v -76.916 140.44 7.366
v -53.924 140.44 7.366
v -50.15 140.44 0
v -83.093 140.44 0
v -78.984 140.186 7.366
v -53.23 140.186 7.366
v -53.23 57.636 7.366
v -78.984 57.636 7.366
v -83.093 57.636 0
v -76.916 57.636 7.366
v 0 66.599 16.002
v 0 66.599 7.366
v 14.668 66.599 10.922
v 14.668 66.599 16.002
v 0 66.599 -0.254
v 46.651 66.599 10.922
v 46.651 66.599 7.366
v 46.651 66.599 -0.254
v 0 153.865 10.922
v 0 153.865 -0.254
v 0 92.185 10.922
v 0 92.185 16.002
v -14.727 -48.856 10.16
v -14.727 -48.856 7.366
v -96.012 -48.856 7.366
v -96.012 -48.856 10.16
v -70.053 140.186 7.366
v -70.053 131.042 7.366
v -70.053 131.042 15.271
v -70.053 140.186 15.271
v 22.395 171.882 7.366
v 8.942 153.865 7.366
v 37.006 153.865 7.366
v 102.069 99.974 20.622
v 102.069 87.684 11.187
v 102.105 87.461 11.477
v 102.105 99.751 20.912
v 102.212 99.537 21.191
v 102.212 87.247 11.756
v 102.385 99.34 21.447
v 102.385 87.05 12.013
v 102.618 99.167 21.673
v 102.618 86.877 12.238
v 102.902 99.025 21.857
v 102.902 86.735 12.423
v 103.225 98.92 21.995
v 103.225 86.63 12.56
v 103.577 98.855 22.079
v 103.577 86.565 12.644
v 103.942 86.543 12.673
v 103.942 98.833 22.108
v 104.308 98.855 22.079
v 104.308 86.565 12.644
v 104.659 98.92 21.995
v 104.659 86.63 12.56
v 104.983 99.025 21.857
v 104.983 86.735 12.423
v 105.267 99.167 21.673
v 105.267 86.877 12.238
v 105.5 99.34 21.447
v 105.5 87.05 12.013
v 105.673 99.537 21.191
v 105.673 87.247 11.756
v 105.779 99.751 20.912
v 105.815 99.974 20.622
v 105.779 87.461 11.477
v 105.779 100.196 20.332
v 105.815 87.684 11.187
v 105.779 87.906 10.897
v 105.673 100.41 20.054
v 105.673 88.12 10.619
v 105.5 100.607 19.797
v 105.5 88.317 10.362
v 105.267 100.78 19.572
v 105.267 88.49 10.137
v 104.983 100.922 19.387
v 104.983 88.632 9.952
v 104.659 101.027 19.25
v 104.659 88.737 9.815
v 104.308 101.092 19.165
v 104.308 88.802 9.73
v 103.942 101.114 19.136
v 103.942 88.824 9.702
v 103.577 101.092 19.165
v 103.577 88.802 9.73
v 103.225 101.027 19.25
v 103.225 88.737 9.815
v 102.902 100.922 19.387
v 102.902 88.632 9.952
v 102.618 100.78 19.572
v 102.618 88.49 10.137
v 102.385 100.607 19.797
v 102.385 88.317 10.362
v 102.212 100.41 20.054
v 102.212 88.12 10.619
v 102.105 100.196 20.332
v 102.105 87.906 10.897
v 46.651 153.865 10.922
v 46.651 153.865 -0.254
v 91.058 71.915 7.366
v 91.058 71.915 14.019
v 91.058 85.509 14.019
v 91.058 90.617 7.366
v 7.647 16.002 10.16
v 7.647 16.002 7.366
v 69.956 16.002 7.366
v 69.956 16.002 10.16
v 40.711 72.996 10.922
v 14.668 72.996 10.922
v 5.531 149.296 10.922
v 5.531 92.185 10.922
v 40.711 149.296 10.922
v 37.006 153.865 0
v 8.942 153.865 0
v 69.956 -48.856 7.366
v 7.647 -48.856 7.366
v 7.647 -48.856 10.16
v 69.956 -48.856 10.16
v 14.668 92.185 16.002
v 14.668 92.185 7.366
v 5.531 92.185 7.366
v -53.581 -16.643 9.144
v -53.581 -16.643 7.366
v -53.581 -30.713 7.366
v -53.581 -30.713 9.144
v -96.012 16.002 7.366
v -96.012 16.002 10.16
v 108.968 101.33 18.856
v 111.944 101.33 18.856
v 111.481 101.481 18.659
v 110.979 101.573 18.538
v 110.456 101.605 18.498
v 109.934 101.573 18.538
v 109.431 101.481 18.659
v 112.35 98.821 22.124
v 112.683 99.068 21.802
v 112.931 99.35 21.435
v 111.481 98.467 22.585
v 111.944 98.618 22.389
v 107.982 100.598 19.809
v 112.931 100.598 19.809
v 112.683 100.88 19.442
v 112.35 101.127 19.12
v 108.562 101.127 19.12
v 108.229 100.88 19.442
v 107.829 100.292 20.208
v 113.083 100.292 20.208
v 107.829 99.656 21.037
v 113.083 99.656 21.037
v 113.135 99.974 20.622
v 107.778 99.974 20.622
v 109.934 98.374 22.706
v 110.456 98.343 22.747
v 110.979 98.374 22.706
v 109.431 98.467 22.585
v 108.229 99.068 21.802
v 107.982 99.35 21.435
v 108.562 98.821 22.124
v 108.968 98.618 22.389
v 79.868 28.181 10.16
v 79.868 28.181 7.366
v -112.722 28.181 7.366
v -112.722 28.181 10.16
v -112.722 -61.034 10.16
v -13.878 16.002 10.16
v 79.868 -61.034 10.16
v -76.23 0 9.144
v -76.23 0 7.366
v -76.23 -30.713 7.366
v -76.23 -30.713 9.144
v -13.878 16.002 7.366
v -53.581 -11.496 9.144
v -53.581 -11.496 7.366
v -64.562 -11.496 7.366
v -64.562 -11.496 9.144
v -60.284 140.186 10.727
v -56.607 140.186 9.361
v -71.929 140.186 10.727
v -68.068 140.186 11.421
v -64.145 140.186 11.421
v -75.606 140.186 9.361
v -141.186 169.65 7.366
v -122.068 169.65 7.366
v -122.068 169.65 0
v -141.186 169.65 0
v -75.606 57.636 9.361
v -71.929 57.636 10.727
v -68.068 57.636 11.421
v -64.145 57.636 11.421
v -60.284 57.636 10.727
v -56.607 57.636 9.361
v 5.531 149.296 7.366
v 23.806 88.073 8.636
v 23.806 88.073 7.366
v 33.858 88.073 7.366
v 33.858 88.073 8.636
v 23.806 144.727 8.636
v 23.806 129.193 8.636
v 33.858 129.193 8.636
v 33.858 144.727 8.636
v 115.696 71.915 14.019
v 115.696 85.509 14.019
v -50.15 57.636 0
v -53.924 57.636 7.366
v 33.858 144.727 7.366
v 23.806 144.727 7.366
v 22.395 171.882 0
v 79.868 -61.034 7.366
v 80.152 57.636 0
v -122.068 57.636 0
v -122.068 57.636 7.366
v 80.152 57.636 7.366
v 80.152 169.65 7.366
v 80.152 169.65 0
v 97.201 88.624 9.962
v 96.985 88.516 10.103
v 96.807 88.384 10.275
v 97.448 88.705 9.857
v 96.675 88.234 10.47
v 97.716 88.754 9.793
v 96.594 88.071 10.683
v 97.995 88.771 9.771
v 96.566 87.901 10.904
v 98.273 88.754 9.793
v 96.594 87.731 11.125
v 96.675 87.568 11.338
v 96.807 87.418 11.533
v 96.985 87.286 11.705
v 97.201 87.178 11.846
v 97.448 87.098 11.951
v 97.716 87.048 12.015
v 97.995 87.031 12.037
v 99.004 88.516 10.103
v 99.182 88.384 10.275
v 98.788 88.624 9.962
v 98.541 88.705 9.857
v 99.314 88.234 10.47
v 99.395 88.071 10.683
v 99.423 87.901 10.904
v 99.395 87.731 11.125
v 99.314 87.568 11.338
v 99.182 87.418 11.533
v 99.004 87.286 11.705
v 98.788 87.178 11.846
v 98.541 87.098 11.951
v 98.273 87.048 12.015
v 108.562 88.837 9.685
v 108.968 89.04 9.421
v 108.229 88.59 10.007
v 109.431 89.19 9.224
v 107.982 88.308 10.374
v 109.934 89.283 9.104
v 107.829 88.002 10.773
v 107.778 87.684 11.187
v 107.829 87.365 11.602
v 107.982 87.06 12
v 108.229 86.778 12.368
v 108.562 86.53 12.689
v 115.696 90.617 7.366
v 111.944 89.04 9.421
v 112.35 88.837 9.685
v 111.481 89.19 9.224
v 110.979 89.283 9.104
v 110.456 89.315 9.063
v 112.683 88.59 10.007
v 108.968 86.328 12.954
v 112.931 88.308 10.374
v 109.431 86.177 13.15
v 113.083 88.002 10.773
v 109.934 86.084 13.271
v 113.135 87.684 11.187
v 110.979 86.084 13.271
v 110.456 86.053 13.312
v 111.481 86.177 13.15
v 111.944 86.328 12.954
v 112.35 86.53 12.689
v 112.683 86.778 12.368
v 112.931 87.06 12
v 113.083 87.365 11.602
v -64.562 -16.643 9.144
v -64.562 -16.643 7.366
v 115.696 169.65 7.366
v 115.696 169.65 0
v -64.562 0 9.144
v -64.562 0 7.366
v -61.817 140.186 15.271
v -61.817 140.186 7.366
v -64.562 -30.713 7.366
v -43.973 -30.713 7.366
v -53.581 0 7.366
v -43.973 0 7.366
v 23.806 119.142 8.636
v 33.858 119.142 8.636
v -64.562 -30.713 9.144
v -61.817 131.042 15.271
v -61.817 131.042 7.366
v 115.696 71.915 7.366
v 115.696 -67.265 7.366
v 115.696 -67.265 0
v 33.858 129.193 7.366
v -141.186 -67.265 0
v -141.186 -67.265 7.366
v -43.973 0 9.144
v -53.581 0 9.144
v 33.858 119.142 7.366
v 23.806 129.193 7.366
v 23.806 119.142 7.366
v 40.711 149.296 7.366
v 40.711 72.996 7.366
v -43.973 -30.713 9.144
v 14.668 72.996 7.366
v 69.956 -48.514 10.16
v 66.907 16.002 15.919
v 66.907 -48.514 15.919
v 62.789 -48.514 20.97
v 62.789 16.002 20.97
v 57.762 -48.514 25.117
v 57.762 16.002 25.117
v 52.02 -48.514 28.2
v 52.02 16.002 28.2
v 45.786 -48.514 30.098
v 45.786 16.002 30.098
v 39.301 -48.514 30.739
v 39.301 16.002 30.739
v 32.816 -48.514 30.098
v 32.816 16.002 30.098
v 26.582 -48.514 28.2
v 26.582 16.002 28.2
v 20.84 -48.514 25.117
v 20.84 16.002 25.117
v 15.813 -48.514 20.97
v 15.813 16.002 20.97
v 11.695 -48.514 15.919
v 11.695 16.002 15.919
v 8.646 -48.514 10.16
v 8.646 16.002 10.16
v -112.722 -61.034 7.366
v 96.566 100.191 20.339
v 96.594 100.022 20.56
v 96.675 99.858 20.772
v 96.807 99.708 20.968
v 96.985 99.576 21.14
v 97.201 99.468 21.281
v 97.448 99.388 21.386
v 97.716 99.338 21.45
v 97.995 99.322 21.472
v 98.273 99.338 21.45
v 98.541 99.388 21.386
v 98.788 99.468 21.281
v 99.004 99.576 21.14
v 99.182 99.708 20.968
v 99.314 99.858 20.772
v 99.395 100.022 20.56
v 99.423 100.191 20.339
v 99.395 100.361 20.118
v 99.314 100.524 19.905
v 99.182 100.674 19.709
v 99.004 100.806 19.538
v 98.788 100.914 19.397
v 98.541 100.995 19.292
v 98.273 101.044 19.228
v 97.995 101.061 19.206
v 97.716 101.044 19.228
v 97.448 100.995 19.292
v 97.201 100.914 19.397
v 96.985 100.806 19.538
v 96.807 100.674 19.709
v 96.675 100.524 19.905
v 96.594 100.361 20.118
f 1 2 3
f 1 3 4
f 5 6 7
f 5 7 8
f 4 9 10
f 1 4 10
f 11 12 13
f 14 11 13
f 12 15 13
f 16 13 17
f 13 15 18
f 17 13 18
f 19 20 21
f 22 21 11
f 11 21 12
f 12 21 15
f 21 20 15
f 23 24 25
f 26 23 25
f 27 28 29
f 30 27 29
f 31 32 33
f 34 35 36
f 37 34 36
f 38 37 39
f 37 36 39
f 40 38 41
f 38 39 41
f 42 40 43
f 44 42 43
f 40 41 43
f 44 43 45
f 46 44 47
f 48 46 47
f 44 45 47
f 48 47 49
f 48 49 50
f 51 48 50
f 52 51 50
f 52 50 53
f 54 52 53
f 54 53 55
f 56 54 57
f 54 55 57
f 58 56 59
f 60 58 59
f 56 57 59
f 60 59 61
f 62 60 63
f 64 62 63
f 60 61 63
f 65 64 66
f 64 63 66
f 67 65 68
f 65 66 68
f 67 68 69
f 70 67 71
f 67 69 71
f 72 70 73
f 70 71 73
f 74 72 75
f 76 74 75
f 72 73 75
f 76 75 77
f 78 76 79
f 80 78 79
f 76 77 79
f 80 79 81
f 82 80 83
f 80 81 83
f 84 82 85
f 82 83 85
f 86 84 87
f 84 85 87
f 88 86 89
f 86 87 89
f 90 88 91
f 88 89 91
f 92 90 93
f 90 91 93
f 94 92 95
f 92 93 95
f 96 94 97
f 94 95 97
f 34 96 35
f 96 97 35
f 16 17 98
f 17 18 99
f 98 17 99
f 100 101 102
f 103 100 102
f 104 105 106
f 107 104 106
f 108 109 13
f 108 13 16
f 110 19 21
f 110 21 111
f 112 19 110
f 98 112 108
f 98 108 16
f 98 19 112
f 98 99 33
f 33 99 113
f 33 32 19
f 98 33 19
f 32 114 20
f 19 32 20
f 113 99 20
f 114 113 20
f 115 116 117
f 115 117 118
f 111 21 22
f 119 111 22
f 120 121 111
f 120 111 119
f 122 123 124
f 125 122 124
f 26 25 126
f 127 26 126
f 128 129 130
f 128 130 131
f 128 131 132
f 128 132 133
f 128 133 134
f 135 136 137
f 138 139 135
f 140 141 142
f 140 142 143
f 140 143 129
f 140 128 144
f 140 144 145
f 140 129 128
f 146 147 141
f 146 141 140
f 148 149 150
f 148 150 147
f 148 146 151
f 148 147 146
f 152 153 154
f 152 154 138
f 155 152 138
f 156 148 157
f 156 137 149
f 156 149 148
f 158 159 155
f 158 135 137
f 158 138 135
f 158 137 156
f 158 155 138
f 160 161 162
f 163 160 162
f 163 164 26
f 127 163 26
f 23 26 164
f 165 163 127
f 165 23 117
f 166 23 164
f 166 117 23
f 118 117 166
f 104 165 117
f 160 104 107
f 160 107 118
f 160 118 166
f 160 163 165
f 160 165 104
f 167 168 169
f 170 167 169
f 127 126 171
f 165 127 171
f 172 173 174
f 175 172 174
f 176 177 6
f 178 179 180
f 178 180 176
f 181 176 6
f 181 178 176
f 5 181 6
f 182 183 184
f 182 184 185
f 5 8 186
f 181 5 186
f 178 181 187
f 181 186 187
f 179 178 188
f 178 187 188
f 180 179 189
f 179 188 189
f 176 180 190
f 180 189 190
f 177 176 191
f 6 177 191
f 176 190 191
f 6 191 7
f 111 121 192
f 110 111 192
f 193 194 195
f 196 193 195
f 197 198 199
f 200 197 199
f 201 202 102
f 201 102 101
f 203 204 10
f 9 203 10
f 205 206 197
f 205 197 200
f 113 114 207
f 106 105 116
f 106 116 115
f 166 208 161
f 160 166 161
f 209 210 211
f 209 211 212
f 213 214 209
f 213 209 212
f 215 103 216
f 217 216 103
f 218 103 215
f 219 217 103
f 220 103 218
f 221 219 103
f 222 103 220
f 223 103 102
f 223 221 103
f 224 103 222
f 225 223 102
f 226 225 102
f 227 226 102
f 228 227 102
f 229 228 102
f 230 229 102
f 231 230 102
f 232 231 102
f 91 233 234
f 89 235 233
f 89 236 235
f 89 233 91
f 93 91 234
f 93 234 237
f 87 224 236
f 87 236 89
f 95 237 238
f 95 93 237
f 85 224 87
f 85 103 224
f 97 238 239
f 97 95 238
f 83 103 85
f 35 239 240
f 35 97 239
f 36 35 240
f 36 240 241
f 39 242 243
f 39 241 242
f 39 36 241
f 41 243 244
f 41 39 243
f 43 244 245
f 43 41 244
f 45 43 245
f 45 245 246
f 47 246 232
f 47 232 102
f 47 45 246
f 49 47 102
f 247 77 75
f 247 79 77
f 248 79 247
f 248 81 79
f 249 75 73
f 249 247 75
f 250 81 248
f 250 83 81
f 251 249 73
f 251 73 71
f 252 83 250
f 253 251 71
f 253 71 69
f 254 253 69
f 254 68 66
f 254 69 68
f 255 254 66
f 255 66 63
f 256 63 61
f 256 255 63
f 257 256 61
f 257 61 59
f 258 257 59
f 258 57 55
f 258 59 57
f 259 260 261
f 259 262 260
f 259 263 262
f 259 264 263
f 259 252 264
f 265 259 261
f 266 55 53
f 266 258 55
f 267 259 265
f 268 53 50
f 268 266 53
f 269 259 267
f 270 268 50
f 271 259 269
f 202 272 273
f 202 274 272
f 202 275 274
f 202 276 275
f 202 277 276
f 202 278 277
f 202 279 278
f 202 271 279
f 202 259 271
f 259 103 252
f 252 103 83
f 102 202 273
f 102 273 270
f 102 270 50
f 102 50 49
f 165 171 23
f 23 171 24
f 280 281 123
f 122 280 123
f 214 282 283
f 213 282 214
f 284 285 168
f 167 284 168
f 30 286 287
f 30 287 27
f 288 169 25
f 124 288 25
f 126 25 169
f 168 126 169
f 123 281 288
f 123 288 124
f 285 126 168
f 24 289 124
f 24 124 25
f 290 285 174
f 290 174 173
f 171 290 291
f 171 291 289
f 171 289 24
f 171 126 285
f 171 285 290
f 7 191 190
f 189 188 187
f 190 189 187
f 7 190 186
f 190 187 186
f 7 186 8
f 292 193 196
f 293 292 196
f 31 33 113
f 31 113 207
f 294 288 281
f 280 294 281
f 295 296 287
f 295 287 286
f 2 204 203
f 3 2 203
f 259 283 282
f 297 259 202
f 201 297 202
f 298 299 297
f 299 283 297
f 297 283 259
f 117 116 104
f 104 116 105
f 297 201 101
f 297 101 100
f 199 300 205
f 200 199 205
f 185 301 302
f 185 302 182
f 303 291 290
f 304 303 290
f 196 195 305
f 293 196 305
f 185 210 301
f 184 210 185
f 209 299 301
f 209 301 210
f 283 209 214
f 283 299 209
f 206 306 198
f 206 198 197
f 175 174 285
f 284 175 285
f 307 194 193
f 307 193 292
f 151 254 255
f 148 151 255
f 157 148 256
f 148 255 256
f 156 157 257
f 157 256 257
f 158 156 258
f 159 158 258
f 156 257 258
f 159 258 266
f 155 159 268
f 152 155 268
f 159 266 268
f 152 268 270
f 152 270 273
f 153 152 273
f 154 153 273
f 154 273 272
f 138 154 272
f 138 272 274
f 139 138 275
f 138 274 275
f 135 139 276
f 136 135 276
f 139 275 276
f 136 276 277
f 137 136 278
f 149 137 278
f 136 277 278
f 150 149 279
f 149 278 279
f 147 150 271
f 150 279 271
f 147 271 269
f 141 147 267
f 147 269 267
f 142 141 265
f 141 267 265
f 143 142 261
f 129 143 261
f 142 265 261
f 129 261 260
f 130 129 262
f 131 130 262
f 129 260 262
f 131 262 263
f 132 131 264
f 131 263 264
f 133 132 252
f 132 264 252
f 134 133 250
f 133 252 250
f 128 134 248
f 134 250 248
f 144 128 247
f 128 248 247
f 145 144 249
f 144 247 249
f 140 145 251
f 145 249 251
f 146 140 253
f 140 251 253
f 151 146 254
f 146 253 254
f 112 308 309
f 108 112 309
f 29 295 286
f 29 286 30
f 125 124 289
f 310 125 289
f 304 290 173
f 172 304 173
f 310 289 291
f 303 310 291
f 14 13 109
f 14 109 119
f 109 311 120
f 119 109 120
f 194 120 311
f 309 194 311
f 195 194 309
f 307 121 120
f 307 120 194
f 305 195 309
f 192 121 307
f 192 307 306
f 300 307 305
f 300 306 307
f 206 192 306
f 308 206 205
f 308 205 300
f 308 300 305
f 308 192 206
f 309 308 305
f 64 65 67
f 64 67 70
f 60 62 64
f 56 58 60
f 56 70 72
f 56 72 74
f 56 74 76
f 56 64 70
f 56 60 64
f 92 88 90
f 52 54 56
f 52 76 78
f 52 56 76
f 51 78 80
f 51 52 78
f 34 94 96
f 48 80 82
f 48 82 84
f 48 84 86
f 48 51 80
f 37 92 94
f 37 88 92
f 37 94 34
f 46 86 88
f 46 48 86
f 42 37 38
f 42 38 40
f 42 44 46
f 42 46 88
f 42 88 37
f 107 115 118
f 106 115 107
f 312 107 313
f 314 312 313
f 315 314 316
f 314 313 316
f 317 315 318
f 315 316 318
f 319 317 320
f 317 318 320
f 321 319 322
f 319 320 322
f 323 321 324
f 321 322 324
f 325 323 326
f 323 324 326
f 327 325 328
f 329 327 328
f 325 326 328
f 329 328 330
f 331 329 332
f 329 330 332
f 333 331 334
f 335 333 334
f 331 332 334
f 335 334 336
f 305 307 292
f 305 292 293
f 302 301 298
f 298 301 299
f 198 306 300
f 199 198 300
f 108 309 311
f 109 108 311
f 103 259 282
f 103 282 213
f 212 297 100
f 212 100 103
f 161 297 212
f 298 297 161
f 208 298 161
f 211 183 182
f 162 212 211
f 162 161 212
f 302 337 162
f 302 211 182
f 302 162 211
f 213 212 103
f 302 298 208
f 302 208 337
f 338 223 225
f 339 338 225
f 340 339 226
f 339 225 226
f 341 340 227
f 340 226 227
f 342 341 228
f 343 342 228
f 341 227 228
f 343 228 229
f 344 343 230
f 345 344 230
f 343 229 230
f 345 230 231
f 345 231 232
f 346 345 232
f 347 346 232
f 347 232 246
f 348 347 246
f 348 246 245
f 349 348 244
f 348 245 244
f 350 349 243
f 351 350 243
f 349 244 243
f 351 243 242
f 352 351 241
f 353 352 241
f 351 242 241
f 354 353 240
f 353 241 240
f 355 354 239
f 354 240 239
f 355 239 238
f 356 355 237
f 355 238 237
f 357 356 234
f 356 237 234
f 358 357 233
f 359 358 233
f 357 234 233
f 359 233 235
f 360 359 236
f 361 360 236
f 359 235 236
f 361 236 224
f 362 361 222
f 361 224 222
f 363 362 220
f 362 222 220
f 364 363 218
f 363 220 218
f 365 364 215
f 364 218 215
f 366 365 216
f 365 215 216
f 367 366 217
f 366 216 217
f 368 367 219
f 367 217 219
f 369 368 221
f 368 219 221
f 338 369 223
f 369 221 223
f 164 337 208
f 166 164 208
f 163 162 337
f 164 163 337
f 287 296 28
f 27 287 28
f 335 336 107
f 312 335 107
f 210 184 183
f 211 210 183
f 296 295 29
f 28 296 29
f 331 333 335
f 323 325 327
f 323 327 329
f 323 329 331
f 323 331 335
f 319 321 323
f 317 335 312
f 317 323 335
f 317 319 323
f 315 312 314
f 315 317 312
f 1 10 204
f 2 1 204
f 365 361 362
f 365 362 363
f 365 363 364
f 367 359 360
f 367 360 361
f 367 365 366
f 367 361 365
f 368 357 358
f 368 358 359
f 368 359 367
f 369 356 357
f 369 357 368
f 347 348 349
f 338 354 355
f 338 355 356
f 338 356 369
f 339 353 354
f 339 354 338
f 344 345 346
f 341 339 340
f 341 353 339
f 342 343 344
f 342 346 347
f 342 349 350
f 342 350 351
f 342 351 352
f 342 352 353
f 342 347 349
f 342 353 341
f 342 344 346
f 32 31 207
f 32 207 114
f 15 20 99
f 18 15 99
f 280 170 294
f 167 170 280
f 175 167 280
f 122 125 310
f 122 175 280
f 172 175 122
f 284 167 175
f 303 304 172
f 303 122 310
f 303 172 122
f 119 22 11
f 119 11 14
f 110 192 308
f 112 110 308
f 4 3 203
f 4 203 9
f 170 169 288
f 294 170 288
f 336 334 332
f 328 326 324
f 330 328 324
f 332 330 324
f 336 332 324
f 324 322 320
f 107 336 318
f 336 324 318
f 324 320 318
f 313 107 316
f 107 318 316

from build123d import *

# Parameters (mm, degrees)
F0_W      = 256.8816542625
F0_H      = 124.9005608261
F1_DEPTH  = 7.366
F2_W      = 62.3086728156
F2_H      = 64.857667312
F3_DEPTH  = 2.794
F5_DEPTH  = 1.778
F7_DEPTH  = 64.516
F8_W      = 35.5442613363
F8_H      = 7.366
F8_W_2    = 19.1174224019
F9_DEPTH  = 112.014
F10_W     = 46.6505549848
F10_H     = 87.2657001019
F11_DEPTH = 7.62
F12_W     = 10.051548481
F12_H     = 15.5342072248
F12_H_2   = 31.0684144497
F13_DEPTH = 1.27
F14_W     = 14.6683594212
F14_H     = 25.5857557058
F15_DEPTH = 8.636
F17_DEPTH = 3.556
F19_DEPTH = 7.366
F21_DEPTH = 82.55
F23_DEPTH = 82.804
F24_W     = 8.2358904183
F24_H     = 7.9047323432
F25_DEPTH = 9.144
F27_DEPTH = 24.638
F28_R     = 2.6783495987
F28_R_2   = 1.4282092452
F28_R_3   = 1.8729701821
F29_DEPTH = 15.494


with BuildPart() as f1:
    # F0 (on Top) → F1 (new body)
    with BuildSketch(Plane.XY):
        with Locations((-12.7449482679, -4.8147607595)):
            Rectangle(F0_W, F0_H)
    extrude(amount=F1_DEPTH)

    # F2 (on face) → F3 (join)
    with BuildSketch(Plane.XY.offset(7.366)):
        Polygon((-112.7220466733, -61.0341802239), (-13.8778332621, -61.0341802239), (79.8683986068, -61.0341802239), (79.8683986068, 28.180513531), (-13.8778332621, 28.180513531), (-112.7220466733, 28.180513531), align=None)
        Polygon((-96.0119962692, 16.0020012408), (-13.8778332621, 16.0020012408), (-14.7274956107, -48.8556660712), (-96.0119962692, -48.8556660712), align=None, mode=Mode.SUBTRACT)
        with Locations((38.8013180345, -16.4268324152)):
            Rectangle(F2_W, F2_H, mode=Mode.SUBTRACT)
    extrude(amount=F3_DEPTH)

    # F4 (on face) → F5 (join)
    with BuildSketch(Plane.XY.offset(7.366)):
        Polygon((-64.562484622, 0), (-76.2300118804, 0), (-76.2300118804, -30.713044107), (-64.562484622, -30.713044107), (-64.562484622, -16.6433826089), (-53.5812862217, -16.6433826089), (-53.5812862217, -30.713044107), (-43.9727380872, -30.713044107), (-43.9727380872, 0), (-53.5812862217, 0), (-53.5812862217, -11.4959450439), (-64.562484622, -11.4959450439), align=None)
    extrude(amount=F5_DEPTH)

    # F8 (on face) → F9 (join)
    with BuildSketch(Plane(origin=(0, 57.6355196536, 0), x_dir=(-1, 0, 0), z_dir=(0, 1, 0))):
        with Locations((-97.9237481952, 3.683)):
            Rectangle(F8_W, F8_H)
        with Locations((131.6270641983, 3.683)):
            Rectangle(F8_W_2, F8_H)
    extrude(amount=F9_DEPTH)

    # F26 (on face) → F27 (join)
    with BuildSketch(Plane.YZ.offset(115.6958788633)):
        Polygon((71.9147920609, 0), (96.2718203664, 0), (85.5094119906, 14.0194511041), (71.9147920609, 14.0194511041), align=None)
    extrude(amount=-F27_DEPTH)

    # F28 (on face) → F29 (join)
    with BuildSketch(Plane(origin=(0, 60.5739241185, 46.5012006136), x_dir=(-1, 0, 0), z_dir=(0, 0.7932192819, 0.6089360974))):
        with Locations((-110.4562953115, -44.5198006928)):
            Circle(F28_R)
        with Locations((-97.9945585132, -44.8768548667)):
            Circle(F28_R_2)
        with Locations((-103.9422005415, -44.5198006928)):
            Circle(F28_R_3)
    extrude(amount=F29_DEPTH)


with BuildPart() as f7:
    # F6 (on face) → F7 (new body)
    with BuildSketch(Plane.XZ.offset(-16.0020012408)):
        with BuildLine():
            Line((8.6464575235, 10.16), (69.9556544423, 10.16))
            ThreePointArc((69.9556544423, 10.16), (39.3010559829, 30.7393329186), (8.6464575235, 10.16))
        make_face()
    extrude(amount=F7_DEPTH)


with BuildPart() as f11:
    # F10 (on face) → F11 (new body)
    with BuildSketch(Plane.XY.offset(7.366)):
        with Locations((23.3252774924, 110.2322638035)):
            Rectangle(F10_W, F10_H)
    extrude(amount=-F11_DEPTH)

    # F12 (on face) → F13 (join)
    with BuildSketch(Plane.XY.offset(7.366)):
        with Locations((28.8319028914, 136.9602456689)):
            Rectangle(F12_W, F12_H)
        with Locations((28.8319028914, 103.6073789001)):
            Rectangle(F12_W, F12_H_2)
    extrude(amount=F13_DEPTH)

    # F14 (on face) → F15 (join)
    with BuildSketch(Plane.XY.offset(7.366)):
        with Locations((7.3341797106, 79.3922916055)):
            Rectangle(F14_W, F14_H)
    extrude(amount=F15_DEPTH)

    # F16 (on face) → F17 (join)
    with BuildSketch(Plane.XY.offset(7.366)):
        Polygon((0, 153.8651138544), (0, 92.1851694584), (5.5305897258, 92.1851694584), (5.5305897258, 149.2962241173), (40.711004287, 149.2962241173), (40.711004287, 72.9958489537), (14.6683594212, 72.9958489537), (14.6683594212, 66.5994137526), (46.6505549848, 66.5994137526), (46.6505549848, 153.8651138544), align=None)
    extrude(amount=F17_DEPTH)

    # F18 (on face) → F19 (join)
    with BuildSketch(Plane.XY.offset(7.366)):
        Polygon((22.3949514329, 171.8819737434), (5.5305897258, 149.2962241173), (40.711004287, 149.2962241173), align=None)
    extrude(amount=-F19_DEPTH)


with BuildPart() as f21:
    # F20 (on face) → F21 (new body)
    with BuildSketch(Plane(origin=(0, 57.6355196536, 0), x_dir=(-1, 0, 0), z_dir=(0, 1, 0))):
        with BuildLine():
            Line((53.2296635239, 7.366), (78.9837650926, 7.366))
            ThreePointArc((78.9837650926, 7.366), (66.1067143083, 11.5081994322), (53.2296635239, 7.366))
        make_face()
    extrude(amount=F21_DEPTH)


with BuildPart() as f23:
    # F22 (on face) → F23 (new body)
    with BuildSketch(Plane(origin=(0, 57.6355196536, 0), x_dir=(-1, 0, 0), z_dir=(0, 1, 0))):
        Polygon((76.9163444638, 7.366), (53.9244525135, 7.366), (50.1496680081, 0), (83.0932632089, 0), align=None)
    extrude(amount=F23_DEPTH)


with BuildPart() as f25:
    # F24 (on face) → F25 (new body)
    with BuildSketch(Plane(origin=(0, 140.1855196536, 0), x_dir=(-1, 0, 0), z_dir=(0, 1, 0))):
        with Locations((65.9351404756, 11.3183661716)):
            Rectangle(F24_W, F24_H)
    extrude(amount=-F25_DEPTH)


solid = Compound([f1.part, f7.part, f11.part, f21.part, f23.part, f25.part])
